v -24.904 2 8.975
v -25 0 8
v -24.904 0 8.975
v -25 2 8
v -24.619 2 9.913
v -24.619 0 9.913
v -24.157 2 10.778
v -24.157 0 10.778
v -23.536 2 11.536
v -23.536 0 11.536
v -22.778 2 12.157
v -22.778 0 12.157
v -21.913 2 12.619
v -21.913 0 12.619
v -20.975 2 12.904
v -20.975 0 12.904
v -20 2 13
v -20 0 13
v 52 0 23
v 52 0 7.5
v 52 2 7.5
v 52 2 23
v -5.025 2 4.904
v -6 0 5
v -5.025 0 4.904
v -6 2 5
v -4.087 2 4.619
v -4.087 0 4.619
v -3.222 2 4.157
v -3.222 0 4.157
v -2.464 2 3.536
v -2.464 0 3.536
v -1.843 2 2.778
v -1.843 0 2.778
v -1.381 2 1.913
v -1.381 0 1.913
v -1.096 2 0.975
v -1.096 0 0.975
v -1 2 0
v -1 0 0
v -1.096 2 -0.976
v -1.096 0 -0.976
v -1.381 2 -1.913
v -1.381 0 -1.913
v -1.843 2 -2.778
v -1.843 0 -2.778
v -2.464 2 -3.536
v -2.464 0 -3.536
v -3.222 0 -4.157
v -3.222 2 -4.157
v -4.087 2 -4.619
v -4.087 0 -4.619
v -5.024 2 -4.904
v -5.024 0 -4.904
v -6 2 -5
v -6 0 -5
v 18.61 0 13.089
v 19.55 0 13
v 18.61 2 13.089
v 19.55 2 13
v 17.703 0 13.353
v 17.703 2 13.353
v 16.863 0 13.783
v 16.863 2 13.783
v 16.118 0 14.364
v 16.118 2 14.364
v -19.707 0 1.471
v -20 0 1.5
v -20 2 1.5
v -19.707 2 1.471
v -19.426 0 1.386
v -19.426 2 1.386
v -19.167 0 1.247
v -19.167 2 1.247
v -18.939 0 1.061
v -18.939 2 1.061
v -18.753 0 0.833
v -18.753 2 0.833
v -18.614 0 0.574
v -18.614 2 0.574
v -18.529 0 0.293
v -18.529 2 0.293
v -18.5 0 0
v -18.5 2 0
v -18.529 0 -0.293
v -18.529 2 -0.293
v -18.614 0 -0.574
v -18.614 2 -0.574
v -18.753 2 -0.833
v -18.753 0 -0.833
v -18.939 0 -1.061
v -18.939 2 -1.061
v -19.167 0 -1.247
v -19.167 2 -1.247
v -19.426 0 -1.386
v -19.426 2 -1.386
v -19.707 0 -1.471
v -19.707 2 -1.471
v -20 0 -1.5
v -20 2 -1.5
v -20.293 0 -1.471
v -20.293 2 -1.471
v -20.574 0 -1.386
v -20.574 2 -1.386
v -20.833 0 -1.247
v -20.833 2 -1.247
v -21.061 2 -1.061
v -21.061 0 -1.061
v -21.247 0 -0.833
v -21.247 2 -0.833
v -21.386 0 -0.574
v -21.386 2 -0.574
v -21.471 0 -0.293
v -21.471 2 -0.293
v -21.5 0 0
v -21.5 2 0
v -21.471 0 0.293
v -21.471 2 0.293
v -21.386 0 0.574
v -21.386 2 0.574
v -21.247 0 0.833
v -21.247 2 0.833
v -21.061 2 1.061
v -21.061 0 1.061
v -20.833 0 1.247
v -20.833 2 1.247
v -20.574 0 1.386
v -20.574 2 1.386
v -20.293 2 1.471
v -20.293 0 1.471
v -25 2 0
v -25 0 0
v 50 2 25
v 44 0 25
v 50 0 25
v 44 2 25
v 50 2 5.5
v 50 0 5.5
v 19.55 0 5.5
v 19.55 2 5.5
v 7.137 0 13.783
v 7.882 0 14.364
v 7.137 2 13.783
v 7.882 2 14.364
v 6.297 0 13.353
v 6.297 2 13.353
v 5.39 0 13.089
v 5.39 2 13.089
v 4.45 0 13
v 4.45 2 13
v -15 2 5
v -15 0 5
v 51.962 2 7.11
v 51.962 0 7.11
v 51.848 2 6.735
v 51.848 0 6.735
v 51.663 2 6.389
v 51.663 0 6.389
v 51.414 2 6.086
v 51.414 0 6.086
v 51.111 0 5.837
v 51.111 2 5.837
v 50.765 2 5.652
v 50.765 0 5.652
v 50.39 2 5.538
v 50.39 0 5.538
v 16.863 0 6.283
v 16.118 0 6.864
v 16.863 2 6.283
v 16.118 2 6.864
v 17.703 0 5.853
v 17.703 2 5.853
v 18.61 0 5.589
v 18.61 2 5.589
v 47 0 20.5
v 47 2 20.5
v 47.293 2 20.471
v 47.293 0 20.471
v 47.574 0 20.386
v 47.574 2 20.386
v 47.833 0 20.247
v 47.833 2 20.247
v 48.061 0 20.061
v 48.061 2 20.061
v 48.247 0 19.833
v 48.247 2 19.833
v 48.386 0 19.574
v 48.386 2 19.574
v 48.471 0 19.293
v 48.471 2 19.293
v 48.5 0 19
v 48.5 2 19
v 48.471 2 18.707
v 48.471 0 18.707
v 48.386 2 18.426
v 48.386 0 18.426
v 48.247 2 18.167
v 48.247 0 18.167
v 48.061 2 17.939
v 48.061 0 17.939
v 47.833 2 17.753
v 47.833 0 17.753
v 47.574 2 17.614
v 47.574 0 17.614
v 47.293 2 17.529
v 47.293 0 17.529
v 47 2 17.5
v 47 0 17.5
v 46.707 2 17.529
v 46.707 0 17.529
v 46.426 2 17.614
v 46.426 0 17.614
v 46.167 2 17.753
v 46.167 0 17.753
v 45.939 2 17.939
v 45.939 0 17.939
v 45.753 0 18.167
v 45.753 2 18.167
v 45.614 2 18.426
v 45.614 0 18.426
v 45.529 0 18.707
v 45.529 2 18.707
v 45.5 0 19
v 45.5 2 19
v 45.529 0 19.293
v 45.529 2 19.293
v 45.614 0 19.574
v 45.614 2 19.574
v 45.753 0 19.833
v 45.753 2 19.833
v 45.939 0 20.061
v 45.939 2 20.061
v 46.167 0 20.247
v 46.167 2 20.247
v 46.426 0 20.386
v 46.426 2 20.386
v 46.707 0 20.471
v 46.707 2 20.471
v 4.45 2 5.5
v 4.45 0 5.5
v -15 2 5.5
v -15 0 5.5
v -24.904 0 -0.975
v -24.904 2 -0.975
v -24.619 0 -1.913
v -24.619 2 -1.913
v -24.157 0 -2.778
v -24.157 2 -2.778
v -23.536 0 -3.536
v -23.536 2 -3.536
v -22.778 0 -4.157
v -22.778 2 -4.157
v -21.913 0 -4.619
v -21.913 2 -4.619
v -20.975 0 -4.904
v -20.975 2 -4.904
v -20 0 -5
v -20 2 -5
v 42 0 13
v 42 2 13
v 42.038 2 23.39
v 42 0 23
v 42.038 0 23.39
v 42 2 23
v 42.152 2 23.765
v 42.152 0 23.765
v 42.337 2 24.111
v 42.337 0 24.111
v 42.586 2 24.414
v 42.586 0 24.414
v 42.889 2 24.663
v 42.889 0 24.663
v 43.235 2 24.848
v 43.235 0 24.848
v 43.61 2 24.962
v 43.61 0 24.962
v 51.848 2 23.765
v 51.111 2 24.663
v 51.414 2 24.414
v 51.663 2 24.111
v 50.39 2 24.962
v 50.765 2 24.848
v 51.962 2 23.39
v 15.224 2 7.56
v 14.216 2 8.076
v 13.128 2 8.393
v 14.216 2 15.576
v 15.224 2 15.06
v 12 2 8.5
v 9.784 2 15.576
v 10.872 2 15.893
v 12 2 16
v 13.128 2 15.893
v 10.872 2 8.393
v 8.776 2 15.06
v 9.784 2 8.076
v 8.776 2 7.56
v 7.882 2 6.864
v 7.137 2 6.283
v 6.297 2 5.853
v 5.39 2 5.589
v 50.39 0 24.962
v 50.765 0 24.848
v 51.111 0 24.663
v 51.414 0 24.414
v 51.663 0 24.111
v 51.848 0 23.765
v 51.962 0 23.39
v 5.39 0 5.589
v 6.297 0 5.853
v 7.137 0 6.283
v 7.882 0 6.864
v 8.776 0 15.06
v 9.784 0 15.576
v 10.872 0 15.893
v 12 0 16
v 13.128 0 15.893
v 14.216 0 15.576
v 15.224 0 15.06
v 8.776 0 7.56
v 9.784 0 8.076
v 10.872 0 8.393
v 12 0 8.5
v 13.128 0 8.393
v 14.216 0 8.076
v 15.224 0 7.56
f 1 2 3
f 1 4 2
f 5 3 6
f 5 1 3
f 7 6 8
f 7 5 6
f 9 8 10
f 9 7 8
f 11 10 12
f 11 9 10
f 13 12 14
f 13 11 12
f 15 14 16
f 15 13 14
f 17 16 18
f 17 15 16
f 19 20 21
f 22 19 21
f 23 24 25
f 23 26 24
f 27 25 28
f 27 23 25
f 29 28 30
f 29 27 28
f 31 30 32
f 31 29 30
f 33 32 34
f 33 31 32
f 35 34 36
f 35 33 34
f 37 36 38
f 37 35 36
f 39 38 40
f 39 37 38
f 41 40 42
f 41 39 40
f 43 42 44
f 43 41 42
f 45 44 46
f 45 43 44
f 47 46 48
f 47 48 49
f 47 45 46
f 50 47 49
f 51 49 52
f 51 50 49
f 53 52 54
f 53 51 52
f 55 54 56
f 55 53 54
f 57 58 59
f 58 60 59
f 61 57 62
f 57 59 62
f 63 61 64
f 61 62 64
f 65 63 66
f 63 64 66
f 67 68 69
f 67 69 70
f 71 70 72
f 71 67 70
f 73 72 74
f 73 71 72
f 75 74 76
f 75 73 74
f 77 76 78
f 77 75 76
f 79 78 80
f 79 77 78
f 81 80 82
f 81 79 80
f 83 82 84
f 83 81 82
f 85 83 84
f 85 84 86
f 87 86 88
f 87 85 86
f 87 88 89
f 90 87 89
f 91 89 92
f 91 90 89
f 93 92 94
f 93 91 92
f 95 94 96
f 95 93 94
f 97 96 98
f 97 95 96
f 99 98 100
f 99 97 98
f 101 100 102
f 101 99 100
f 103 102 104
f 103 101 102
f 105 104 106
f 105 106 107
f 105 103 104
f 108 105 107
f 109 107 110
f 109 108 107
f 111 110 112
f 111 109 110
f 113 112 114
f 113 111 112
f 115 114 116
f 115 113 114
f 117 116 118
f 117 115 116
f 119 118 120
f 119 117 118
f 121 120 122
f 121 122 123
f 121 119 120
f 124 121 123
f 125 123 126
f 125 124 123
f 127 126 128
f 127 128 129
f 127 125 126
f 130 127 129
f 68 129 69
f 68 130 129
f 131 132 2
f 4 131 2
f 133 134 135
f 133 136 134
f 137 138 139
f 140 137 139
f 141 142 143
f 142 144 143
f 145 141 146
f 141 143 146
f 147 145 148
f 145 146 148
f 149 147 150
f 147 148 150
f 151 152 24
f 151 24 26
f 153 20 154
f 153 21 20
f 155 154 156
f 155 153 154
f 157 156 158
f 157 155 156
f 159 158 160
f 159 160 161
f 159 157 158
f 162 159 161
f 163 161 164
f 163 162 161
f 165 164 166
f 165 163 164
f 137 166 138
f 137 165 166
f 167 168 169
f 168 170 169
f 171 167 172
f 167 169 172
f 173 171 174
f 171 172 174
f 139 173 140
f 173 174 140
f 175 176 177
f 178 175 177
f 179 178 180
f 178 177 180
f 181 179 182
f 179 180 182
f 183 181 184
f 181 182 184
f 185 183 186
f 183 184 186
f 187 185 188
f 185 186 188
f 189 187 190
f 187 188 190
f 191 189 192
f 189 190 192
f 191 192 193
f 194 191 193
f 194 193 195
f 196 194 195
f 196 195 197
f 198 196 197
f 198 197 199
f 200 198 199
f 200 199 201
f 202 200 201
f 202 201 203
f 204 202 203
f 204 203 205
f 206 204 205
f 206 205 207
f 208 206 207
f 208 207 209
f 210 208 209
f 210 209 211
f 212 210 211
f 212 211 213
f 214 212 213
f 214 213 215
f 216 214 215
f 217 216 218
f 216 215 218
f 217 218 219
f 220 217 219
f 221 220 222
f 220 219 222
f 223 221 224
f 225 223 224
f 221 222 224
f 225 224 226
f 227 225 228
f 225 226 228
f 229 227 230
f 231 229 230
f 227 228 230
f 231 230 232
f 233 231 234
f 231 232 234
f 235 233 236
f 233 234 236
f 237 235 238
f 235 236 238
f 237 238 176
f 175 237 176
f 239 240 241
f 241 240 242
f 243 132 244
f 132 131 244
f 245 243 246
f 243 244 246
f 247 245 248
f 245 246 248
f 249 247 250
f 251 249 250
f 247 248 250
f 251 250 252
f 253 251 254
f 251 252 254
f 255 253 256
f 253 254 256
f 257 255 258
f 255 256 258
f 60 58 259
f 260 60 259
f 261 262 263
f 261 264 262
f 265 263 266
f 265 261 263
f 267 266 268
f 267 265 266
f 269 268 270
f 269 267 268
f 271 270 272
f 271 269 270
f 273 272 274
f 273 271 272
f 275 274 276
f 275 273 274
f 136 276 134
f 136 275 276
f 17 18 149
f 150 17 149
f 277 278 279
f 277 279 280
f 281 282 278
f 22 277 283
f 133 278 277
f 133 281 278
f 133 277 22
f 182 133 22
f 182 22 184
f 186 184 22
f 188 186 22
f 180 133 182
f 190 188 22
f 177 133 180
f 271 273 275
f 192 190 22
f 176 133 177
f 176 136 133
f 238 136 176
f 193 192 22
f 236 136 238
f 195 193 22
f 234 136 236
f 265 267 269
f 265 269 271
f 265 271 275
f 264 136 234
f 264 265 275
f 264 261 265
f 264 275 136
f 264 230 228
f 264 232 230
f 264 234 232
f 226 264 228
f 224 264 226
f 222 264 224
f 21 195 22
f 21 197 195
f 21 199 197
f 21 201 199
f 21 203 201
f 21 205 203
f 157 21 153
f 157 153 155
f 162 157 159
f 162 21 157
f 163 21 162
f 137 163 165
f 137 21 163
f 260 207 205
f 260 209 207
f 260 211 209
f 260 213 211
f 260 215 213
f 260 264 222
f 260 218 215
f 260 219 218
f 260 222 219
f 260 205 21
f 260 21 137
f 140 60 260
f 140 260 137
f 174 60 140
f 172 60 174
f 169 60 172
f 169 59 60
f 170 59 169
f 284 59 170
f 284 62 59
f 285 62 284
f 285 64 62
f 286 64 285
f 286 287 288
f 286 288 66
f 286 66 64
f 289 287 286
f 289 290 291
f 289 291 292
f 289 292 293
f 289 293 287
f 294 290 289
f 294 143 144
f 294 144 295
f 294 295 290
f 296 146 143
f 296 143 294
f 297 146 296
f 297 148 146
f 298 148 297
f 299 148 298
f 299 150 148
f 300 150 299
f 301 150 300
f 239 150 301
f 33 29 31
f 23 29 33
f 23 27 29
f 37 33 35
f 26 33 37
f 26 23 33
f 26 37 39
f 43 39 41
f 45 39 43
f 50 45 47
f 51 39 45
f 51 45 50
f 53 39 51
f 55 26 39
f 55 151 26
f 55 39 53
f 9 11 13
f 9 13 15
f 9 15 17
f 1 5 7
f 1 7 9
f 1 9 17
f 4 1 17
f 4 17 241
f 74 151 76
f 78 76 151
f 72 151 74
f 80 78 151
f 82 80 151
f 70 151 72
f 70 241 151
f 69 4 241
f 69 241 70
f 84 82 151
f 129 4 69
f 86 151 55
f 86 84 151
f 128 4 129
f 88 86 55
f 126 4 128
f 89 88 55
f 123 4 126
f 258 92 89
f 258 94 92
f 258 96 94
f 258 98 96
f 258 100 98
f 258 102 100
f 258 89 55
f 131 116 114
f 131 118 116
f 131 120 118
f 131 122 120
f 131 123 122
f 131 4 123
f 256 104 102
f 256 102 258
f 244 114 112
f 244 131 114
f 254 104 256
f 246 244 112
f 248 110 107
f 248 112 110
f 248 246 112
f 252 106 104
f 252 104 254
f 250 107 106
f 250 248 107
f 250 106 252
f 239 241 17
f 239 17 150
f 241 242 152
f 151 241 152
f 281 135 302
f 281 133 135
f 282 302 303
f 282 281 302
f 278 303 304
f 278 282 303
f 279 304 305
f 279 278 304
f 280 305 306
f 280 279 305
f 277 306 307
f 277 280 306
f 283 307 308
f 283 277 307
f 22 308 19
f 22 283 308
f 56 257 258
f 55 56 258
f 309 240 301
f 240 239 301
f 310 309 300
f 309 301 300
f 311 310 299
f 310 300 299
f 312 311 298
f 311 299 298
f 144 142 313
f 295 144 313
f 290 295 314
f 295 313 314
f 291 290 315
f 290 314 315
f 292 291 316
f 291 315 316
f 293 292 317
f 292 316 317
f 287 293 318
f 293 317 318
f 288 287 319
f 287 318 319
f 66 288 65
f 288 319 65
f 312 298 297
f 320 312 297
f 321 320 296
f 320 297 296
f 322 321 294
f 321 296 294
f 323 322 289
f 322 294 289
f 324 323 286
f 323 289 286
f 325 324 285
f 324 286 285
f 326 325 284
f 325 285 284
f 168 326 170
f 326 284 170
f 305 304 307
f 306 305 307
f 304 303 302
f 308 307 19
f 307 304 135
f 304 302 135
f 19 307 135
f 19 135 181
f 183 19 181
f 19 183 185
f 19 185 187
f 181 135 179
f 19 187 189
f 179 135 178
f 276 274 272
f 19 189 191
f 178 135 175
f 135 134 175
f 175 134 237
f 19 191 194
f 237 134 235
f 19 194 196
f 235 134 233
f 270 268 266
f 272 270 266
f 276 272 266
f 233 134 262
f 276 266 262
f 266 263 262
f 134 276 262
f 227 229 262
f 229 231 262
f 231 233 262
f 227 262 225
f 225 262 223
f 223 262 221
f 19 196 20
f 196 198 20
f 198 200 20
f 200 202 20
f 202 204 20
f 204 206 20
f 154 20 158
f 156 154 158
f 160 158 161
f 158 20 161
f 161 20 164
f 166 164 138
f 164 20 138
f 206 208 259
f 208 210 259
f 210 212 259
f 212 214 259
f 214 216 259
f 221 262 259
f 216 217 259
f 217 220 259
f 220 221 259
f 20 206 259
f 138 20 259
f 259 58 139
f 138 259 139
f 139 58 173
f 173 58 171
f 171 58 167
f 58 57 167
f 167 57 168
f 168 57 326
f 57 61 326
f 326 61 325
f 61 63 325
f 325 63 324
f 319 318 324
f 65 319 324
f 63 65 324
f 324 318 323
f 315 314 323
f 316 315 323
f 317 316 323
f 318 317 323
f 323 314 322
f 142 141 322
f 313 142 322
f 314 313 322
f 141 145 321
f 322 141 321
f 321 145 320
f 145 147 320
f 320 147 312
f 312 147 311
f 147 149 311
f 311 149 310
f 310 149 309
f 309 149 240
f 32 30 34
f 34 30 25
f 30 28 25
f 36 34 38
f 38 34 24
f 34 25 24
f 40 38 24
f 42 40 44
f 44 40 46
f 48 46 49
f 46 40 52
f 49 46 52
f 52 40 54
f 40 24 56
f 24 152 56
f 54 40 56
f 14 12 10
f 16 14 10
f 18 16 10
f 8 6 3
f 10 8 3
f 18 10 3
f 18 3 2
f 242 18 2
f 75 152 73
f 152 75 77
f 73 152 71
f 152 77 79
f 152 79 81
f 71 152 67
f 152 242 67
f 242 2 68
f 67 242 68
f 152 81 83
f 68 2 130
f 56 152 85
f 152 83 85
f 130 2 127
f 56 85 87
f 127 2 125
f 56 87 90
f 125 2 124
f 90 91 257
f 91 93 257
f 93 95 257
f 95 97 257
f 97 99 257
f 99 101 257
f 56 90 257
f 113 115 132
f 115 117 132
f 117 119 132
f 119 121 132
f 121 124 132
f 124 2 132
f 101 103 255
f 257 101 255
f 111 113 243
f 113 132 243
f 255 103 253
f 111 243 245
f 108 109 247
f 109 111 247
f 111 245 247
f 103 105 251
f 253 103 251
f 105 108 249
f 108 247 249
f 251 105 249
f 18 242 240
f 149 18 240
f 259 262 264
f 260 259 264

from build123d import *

# Parameters (mm, degrees)
SKETCH_1_R          = 1.5
EXTRUDE_1_DEPTH     = 2
FILLET_2_R          = 5
FILLET_3_R          = 5
SKETCH_7_R          = 6
CUT_EXTRUDE_4_DEPTH = 10
FILLET_5_R          = 5
SKETCH_8_W          = 10
SKETCH_8_H          = 2
EXTRUDE_3_DEPTH     = 12
SKETCH_9_R          = 1.5
CUT_EXTRUDE_5_DEPTH = 12
FILLET_6_R          = 2
SKETCH_10_W         = 10
SKETCH_10_H         = 2
EXTRUDE_4_DEPTH     = 14
FILLET_7_R          = 5
FILLET_8_R          = 5


with BuildPart() as part:
    # 草图1 → 凸台-拉伸1 (new body)
    with BuildSketch(Plane(origin=(0, 0, 0), x_dir=(1, 0, 0), z_dir=(0, 1, 0))):
        with BuildLine():
            Line((17.196152423, -13), (52, -13))
            Line((52, -13), (52, -5.5))
            Line((52, -5.5), (-15, -5.5))
            Line((-15, -5.5), (-15, 5))
            Line((-15, 5), (-25, 5))
            Line((-25, 5), (-25, -13))
            Line((-25, -13), (6.803847577, -13))
            ThreePointArc((6.803847577, -13), (12, -16), (17.196152423, -13))
        make_face()
        with Locations(Location((-20, 0, 0), (0, 0, 270))):
            Circle(SKETCH_1_R, mode=Mode.SUBTRACT)
    extrude(amount=EXTRUDE_1_DEPTH)

    # 圆角2
    fillet_2_edges = [part.edges().sort_by_distance(p)[0] for p in [
        (-25, 1, -5),
    ]]
    fillet(fillet_2_edges, radius=FILLET_2_R)

    # 圆角3
    fillet_3_edges = [part.edges().sort_by_distance(p)[0] for p in [
        (-25, 1, 13),
    ]]
    fillet(fillet_3_edges, radius=FILLET_3_R)

    # 草图7 → 切除-拉伸4 (cut)
    with BuildSketch(Plane(origin=(0, 2, 0), x_dir=(1, 0, 0), z_dir=(0, 1, 0))):
        with Locations((12, -2.5)):
            Circle(SKETCH_7_R)
    extrude(amount=-CUT_EXTRUDE_4_DEPTH, mode=Mode.SUBTRACT)

    # 圆角5
    fillet_5_edges = [part.edges().sort_by_distance(p)[0] for p in [
        (17.196152423, 1, 13),
        (6.803847577, 1, 13),
        (6.803847577, 1, 5.5),
        (17.196152423, 1, 5.5),
    ]]
    fillet(fillet_5_edges, radius=FILLET_5_R)

    # 草图8 → 凸台-拉伸3 (add)
    with BuildSketch(Plane.XY.offset(13)):
        with Locations((47, 1)):
            Rectangle(SKETCH_8_W, SKETCH_8_H)
    extrude(amount=EXTRUDE_3_DEPTH)

    # 草图9 → 切除-拉伸5 (cut)
    with BuildSketch(Plane(origin=(0, 2, 0), x_dir=(1, 0, 0), z_dir=(0, 1, 0))):
        with Locations(Location((47, -19, 0), (0, 0, 270))):
            Circle(SKETCH_9_R)
    extrude(amount=-CUT_EXTRUDE_5_DEPTH, mode=Mode.SUBTRACT)

    # 圆角6
    fillet_6_edges = [part.edges().sort_by_distance(p)[0] for p in [
        (52, 1, 5.5),
        (52, 1, 25),
        (42, 1, 25),
    ]]
    fillet(fillet_6_edges, radius=FILLET_6_R)

    # 草图10 → 凸台-拉伸4 (add)
    with BuildSketch(Plane(origin=(-15, 0, 0), x_dir=(0, 0, -1), z_dir=(1, 0, 0))):
        with Locations((0, 1)):
            Rectangle(SKETCH_10_W, SKETCH_10_H)
    extrude(amount=EXTRUDE_4_DEPTH)

    # 圆角7
    fillet_7_edges = [part.edges().sort_by_distance(p)[0] for p in [
        (-1, 1, 5),
    ]]
    fillet(fillet_7_edges, radius=FILLET_7_R)

    # 圆角8
    fillet_8_edges = [part.edges().sort_by_distance(p)[0] for p in [
        (-1, 1, -5),
    ]]
    fillet(fillet_8_edges, radius=FILLET_8_R - 0.0001)  # a hair under: the kernel refuses the full size


solid = part.part
